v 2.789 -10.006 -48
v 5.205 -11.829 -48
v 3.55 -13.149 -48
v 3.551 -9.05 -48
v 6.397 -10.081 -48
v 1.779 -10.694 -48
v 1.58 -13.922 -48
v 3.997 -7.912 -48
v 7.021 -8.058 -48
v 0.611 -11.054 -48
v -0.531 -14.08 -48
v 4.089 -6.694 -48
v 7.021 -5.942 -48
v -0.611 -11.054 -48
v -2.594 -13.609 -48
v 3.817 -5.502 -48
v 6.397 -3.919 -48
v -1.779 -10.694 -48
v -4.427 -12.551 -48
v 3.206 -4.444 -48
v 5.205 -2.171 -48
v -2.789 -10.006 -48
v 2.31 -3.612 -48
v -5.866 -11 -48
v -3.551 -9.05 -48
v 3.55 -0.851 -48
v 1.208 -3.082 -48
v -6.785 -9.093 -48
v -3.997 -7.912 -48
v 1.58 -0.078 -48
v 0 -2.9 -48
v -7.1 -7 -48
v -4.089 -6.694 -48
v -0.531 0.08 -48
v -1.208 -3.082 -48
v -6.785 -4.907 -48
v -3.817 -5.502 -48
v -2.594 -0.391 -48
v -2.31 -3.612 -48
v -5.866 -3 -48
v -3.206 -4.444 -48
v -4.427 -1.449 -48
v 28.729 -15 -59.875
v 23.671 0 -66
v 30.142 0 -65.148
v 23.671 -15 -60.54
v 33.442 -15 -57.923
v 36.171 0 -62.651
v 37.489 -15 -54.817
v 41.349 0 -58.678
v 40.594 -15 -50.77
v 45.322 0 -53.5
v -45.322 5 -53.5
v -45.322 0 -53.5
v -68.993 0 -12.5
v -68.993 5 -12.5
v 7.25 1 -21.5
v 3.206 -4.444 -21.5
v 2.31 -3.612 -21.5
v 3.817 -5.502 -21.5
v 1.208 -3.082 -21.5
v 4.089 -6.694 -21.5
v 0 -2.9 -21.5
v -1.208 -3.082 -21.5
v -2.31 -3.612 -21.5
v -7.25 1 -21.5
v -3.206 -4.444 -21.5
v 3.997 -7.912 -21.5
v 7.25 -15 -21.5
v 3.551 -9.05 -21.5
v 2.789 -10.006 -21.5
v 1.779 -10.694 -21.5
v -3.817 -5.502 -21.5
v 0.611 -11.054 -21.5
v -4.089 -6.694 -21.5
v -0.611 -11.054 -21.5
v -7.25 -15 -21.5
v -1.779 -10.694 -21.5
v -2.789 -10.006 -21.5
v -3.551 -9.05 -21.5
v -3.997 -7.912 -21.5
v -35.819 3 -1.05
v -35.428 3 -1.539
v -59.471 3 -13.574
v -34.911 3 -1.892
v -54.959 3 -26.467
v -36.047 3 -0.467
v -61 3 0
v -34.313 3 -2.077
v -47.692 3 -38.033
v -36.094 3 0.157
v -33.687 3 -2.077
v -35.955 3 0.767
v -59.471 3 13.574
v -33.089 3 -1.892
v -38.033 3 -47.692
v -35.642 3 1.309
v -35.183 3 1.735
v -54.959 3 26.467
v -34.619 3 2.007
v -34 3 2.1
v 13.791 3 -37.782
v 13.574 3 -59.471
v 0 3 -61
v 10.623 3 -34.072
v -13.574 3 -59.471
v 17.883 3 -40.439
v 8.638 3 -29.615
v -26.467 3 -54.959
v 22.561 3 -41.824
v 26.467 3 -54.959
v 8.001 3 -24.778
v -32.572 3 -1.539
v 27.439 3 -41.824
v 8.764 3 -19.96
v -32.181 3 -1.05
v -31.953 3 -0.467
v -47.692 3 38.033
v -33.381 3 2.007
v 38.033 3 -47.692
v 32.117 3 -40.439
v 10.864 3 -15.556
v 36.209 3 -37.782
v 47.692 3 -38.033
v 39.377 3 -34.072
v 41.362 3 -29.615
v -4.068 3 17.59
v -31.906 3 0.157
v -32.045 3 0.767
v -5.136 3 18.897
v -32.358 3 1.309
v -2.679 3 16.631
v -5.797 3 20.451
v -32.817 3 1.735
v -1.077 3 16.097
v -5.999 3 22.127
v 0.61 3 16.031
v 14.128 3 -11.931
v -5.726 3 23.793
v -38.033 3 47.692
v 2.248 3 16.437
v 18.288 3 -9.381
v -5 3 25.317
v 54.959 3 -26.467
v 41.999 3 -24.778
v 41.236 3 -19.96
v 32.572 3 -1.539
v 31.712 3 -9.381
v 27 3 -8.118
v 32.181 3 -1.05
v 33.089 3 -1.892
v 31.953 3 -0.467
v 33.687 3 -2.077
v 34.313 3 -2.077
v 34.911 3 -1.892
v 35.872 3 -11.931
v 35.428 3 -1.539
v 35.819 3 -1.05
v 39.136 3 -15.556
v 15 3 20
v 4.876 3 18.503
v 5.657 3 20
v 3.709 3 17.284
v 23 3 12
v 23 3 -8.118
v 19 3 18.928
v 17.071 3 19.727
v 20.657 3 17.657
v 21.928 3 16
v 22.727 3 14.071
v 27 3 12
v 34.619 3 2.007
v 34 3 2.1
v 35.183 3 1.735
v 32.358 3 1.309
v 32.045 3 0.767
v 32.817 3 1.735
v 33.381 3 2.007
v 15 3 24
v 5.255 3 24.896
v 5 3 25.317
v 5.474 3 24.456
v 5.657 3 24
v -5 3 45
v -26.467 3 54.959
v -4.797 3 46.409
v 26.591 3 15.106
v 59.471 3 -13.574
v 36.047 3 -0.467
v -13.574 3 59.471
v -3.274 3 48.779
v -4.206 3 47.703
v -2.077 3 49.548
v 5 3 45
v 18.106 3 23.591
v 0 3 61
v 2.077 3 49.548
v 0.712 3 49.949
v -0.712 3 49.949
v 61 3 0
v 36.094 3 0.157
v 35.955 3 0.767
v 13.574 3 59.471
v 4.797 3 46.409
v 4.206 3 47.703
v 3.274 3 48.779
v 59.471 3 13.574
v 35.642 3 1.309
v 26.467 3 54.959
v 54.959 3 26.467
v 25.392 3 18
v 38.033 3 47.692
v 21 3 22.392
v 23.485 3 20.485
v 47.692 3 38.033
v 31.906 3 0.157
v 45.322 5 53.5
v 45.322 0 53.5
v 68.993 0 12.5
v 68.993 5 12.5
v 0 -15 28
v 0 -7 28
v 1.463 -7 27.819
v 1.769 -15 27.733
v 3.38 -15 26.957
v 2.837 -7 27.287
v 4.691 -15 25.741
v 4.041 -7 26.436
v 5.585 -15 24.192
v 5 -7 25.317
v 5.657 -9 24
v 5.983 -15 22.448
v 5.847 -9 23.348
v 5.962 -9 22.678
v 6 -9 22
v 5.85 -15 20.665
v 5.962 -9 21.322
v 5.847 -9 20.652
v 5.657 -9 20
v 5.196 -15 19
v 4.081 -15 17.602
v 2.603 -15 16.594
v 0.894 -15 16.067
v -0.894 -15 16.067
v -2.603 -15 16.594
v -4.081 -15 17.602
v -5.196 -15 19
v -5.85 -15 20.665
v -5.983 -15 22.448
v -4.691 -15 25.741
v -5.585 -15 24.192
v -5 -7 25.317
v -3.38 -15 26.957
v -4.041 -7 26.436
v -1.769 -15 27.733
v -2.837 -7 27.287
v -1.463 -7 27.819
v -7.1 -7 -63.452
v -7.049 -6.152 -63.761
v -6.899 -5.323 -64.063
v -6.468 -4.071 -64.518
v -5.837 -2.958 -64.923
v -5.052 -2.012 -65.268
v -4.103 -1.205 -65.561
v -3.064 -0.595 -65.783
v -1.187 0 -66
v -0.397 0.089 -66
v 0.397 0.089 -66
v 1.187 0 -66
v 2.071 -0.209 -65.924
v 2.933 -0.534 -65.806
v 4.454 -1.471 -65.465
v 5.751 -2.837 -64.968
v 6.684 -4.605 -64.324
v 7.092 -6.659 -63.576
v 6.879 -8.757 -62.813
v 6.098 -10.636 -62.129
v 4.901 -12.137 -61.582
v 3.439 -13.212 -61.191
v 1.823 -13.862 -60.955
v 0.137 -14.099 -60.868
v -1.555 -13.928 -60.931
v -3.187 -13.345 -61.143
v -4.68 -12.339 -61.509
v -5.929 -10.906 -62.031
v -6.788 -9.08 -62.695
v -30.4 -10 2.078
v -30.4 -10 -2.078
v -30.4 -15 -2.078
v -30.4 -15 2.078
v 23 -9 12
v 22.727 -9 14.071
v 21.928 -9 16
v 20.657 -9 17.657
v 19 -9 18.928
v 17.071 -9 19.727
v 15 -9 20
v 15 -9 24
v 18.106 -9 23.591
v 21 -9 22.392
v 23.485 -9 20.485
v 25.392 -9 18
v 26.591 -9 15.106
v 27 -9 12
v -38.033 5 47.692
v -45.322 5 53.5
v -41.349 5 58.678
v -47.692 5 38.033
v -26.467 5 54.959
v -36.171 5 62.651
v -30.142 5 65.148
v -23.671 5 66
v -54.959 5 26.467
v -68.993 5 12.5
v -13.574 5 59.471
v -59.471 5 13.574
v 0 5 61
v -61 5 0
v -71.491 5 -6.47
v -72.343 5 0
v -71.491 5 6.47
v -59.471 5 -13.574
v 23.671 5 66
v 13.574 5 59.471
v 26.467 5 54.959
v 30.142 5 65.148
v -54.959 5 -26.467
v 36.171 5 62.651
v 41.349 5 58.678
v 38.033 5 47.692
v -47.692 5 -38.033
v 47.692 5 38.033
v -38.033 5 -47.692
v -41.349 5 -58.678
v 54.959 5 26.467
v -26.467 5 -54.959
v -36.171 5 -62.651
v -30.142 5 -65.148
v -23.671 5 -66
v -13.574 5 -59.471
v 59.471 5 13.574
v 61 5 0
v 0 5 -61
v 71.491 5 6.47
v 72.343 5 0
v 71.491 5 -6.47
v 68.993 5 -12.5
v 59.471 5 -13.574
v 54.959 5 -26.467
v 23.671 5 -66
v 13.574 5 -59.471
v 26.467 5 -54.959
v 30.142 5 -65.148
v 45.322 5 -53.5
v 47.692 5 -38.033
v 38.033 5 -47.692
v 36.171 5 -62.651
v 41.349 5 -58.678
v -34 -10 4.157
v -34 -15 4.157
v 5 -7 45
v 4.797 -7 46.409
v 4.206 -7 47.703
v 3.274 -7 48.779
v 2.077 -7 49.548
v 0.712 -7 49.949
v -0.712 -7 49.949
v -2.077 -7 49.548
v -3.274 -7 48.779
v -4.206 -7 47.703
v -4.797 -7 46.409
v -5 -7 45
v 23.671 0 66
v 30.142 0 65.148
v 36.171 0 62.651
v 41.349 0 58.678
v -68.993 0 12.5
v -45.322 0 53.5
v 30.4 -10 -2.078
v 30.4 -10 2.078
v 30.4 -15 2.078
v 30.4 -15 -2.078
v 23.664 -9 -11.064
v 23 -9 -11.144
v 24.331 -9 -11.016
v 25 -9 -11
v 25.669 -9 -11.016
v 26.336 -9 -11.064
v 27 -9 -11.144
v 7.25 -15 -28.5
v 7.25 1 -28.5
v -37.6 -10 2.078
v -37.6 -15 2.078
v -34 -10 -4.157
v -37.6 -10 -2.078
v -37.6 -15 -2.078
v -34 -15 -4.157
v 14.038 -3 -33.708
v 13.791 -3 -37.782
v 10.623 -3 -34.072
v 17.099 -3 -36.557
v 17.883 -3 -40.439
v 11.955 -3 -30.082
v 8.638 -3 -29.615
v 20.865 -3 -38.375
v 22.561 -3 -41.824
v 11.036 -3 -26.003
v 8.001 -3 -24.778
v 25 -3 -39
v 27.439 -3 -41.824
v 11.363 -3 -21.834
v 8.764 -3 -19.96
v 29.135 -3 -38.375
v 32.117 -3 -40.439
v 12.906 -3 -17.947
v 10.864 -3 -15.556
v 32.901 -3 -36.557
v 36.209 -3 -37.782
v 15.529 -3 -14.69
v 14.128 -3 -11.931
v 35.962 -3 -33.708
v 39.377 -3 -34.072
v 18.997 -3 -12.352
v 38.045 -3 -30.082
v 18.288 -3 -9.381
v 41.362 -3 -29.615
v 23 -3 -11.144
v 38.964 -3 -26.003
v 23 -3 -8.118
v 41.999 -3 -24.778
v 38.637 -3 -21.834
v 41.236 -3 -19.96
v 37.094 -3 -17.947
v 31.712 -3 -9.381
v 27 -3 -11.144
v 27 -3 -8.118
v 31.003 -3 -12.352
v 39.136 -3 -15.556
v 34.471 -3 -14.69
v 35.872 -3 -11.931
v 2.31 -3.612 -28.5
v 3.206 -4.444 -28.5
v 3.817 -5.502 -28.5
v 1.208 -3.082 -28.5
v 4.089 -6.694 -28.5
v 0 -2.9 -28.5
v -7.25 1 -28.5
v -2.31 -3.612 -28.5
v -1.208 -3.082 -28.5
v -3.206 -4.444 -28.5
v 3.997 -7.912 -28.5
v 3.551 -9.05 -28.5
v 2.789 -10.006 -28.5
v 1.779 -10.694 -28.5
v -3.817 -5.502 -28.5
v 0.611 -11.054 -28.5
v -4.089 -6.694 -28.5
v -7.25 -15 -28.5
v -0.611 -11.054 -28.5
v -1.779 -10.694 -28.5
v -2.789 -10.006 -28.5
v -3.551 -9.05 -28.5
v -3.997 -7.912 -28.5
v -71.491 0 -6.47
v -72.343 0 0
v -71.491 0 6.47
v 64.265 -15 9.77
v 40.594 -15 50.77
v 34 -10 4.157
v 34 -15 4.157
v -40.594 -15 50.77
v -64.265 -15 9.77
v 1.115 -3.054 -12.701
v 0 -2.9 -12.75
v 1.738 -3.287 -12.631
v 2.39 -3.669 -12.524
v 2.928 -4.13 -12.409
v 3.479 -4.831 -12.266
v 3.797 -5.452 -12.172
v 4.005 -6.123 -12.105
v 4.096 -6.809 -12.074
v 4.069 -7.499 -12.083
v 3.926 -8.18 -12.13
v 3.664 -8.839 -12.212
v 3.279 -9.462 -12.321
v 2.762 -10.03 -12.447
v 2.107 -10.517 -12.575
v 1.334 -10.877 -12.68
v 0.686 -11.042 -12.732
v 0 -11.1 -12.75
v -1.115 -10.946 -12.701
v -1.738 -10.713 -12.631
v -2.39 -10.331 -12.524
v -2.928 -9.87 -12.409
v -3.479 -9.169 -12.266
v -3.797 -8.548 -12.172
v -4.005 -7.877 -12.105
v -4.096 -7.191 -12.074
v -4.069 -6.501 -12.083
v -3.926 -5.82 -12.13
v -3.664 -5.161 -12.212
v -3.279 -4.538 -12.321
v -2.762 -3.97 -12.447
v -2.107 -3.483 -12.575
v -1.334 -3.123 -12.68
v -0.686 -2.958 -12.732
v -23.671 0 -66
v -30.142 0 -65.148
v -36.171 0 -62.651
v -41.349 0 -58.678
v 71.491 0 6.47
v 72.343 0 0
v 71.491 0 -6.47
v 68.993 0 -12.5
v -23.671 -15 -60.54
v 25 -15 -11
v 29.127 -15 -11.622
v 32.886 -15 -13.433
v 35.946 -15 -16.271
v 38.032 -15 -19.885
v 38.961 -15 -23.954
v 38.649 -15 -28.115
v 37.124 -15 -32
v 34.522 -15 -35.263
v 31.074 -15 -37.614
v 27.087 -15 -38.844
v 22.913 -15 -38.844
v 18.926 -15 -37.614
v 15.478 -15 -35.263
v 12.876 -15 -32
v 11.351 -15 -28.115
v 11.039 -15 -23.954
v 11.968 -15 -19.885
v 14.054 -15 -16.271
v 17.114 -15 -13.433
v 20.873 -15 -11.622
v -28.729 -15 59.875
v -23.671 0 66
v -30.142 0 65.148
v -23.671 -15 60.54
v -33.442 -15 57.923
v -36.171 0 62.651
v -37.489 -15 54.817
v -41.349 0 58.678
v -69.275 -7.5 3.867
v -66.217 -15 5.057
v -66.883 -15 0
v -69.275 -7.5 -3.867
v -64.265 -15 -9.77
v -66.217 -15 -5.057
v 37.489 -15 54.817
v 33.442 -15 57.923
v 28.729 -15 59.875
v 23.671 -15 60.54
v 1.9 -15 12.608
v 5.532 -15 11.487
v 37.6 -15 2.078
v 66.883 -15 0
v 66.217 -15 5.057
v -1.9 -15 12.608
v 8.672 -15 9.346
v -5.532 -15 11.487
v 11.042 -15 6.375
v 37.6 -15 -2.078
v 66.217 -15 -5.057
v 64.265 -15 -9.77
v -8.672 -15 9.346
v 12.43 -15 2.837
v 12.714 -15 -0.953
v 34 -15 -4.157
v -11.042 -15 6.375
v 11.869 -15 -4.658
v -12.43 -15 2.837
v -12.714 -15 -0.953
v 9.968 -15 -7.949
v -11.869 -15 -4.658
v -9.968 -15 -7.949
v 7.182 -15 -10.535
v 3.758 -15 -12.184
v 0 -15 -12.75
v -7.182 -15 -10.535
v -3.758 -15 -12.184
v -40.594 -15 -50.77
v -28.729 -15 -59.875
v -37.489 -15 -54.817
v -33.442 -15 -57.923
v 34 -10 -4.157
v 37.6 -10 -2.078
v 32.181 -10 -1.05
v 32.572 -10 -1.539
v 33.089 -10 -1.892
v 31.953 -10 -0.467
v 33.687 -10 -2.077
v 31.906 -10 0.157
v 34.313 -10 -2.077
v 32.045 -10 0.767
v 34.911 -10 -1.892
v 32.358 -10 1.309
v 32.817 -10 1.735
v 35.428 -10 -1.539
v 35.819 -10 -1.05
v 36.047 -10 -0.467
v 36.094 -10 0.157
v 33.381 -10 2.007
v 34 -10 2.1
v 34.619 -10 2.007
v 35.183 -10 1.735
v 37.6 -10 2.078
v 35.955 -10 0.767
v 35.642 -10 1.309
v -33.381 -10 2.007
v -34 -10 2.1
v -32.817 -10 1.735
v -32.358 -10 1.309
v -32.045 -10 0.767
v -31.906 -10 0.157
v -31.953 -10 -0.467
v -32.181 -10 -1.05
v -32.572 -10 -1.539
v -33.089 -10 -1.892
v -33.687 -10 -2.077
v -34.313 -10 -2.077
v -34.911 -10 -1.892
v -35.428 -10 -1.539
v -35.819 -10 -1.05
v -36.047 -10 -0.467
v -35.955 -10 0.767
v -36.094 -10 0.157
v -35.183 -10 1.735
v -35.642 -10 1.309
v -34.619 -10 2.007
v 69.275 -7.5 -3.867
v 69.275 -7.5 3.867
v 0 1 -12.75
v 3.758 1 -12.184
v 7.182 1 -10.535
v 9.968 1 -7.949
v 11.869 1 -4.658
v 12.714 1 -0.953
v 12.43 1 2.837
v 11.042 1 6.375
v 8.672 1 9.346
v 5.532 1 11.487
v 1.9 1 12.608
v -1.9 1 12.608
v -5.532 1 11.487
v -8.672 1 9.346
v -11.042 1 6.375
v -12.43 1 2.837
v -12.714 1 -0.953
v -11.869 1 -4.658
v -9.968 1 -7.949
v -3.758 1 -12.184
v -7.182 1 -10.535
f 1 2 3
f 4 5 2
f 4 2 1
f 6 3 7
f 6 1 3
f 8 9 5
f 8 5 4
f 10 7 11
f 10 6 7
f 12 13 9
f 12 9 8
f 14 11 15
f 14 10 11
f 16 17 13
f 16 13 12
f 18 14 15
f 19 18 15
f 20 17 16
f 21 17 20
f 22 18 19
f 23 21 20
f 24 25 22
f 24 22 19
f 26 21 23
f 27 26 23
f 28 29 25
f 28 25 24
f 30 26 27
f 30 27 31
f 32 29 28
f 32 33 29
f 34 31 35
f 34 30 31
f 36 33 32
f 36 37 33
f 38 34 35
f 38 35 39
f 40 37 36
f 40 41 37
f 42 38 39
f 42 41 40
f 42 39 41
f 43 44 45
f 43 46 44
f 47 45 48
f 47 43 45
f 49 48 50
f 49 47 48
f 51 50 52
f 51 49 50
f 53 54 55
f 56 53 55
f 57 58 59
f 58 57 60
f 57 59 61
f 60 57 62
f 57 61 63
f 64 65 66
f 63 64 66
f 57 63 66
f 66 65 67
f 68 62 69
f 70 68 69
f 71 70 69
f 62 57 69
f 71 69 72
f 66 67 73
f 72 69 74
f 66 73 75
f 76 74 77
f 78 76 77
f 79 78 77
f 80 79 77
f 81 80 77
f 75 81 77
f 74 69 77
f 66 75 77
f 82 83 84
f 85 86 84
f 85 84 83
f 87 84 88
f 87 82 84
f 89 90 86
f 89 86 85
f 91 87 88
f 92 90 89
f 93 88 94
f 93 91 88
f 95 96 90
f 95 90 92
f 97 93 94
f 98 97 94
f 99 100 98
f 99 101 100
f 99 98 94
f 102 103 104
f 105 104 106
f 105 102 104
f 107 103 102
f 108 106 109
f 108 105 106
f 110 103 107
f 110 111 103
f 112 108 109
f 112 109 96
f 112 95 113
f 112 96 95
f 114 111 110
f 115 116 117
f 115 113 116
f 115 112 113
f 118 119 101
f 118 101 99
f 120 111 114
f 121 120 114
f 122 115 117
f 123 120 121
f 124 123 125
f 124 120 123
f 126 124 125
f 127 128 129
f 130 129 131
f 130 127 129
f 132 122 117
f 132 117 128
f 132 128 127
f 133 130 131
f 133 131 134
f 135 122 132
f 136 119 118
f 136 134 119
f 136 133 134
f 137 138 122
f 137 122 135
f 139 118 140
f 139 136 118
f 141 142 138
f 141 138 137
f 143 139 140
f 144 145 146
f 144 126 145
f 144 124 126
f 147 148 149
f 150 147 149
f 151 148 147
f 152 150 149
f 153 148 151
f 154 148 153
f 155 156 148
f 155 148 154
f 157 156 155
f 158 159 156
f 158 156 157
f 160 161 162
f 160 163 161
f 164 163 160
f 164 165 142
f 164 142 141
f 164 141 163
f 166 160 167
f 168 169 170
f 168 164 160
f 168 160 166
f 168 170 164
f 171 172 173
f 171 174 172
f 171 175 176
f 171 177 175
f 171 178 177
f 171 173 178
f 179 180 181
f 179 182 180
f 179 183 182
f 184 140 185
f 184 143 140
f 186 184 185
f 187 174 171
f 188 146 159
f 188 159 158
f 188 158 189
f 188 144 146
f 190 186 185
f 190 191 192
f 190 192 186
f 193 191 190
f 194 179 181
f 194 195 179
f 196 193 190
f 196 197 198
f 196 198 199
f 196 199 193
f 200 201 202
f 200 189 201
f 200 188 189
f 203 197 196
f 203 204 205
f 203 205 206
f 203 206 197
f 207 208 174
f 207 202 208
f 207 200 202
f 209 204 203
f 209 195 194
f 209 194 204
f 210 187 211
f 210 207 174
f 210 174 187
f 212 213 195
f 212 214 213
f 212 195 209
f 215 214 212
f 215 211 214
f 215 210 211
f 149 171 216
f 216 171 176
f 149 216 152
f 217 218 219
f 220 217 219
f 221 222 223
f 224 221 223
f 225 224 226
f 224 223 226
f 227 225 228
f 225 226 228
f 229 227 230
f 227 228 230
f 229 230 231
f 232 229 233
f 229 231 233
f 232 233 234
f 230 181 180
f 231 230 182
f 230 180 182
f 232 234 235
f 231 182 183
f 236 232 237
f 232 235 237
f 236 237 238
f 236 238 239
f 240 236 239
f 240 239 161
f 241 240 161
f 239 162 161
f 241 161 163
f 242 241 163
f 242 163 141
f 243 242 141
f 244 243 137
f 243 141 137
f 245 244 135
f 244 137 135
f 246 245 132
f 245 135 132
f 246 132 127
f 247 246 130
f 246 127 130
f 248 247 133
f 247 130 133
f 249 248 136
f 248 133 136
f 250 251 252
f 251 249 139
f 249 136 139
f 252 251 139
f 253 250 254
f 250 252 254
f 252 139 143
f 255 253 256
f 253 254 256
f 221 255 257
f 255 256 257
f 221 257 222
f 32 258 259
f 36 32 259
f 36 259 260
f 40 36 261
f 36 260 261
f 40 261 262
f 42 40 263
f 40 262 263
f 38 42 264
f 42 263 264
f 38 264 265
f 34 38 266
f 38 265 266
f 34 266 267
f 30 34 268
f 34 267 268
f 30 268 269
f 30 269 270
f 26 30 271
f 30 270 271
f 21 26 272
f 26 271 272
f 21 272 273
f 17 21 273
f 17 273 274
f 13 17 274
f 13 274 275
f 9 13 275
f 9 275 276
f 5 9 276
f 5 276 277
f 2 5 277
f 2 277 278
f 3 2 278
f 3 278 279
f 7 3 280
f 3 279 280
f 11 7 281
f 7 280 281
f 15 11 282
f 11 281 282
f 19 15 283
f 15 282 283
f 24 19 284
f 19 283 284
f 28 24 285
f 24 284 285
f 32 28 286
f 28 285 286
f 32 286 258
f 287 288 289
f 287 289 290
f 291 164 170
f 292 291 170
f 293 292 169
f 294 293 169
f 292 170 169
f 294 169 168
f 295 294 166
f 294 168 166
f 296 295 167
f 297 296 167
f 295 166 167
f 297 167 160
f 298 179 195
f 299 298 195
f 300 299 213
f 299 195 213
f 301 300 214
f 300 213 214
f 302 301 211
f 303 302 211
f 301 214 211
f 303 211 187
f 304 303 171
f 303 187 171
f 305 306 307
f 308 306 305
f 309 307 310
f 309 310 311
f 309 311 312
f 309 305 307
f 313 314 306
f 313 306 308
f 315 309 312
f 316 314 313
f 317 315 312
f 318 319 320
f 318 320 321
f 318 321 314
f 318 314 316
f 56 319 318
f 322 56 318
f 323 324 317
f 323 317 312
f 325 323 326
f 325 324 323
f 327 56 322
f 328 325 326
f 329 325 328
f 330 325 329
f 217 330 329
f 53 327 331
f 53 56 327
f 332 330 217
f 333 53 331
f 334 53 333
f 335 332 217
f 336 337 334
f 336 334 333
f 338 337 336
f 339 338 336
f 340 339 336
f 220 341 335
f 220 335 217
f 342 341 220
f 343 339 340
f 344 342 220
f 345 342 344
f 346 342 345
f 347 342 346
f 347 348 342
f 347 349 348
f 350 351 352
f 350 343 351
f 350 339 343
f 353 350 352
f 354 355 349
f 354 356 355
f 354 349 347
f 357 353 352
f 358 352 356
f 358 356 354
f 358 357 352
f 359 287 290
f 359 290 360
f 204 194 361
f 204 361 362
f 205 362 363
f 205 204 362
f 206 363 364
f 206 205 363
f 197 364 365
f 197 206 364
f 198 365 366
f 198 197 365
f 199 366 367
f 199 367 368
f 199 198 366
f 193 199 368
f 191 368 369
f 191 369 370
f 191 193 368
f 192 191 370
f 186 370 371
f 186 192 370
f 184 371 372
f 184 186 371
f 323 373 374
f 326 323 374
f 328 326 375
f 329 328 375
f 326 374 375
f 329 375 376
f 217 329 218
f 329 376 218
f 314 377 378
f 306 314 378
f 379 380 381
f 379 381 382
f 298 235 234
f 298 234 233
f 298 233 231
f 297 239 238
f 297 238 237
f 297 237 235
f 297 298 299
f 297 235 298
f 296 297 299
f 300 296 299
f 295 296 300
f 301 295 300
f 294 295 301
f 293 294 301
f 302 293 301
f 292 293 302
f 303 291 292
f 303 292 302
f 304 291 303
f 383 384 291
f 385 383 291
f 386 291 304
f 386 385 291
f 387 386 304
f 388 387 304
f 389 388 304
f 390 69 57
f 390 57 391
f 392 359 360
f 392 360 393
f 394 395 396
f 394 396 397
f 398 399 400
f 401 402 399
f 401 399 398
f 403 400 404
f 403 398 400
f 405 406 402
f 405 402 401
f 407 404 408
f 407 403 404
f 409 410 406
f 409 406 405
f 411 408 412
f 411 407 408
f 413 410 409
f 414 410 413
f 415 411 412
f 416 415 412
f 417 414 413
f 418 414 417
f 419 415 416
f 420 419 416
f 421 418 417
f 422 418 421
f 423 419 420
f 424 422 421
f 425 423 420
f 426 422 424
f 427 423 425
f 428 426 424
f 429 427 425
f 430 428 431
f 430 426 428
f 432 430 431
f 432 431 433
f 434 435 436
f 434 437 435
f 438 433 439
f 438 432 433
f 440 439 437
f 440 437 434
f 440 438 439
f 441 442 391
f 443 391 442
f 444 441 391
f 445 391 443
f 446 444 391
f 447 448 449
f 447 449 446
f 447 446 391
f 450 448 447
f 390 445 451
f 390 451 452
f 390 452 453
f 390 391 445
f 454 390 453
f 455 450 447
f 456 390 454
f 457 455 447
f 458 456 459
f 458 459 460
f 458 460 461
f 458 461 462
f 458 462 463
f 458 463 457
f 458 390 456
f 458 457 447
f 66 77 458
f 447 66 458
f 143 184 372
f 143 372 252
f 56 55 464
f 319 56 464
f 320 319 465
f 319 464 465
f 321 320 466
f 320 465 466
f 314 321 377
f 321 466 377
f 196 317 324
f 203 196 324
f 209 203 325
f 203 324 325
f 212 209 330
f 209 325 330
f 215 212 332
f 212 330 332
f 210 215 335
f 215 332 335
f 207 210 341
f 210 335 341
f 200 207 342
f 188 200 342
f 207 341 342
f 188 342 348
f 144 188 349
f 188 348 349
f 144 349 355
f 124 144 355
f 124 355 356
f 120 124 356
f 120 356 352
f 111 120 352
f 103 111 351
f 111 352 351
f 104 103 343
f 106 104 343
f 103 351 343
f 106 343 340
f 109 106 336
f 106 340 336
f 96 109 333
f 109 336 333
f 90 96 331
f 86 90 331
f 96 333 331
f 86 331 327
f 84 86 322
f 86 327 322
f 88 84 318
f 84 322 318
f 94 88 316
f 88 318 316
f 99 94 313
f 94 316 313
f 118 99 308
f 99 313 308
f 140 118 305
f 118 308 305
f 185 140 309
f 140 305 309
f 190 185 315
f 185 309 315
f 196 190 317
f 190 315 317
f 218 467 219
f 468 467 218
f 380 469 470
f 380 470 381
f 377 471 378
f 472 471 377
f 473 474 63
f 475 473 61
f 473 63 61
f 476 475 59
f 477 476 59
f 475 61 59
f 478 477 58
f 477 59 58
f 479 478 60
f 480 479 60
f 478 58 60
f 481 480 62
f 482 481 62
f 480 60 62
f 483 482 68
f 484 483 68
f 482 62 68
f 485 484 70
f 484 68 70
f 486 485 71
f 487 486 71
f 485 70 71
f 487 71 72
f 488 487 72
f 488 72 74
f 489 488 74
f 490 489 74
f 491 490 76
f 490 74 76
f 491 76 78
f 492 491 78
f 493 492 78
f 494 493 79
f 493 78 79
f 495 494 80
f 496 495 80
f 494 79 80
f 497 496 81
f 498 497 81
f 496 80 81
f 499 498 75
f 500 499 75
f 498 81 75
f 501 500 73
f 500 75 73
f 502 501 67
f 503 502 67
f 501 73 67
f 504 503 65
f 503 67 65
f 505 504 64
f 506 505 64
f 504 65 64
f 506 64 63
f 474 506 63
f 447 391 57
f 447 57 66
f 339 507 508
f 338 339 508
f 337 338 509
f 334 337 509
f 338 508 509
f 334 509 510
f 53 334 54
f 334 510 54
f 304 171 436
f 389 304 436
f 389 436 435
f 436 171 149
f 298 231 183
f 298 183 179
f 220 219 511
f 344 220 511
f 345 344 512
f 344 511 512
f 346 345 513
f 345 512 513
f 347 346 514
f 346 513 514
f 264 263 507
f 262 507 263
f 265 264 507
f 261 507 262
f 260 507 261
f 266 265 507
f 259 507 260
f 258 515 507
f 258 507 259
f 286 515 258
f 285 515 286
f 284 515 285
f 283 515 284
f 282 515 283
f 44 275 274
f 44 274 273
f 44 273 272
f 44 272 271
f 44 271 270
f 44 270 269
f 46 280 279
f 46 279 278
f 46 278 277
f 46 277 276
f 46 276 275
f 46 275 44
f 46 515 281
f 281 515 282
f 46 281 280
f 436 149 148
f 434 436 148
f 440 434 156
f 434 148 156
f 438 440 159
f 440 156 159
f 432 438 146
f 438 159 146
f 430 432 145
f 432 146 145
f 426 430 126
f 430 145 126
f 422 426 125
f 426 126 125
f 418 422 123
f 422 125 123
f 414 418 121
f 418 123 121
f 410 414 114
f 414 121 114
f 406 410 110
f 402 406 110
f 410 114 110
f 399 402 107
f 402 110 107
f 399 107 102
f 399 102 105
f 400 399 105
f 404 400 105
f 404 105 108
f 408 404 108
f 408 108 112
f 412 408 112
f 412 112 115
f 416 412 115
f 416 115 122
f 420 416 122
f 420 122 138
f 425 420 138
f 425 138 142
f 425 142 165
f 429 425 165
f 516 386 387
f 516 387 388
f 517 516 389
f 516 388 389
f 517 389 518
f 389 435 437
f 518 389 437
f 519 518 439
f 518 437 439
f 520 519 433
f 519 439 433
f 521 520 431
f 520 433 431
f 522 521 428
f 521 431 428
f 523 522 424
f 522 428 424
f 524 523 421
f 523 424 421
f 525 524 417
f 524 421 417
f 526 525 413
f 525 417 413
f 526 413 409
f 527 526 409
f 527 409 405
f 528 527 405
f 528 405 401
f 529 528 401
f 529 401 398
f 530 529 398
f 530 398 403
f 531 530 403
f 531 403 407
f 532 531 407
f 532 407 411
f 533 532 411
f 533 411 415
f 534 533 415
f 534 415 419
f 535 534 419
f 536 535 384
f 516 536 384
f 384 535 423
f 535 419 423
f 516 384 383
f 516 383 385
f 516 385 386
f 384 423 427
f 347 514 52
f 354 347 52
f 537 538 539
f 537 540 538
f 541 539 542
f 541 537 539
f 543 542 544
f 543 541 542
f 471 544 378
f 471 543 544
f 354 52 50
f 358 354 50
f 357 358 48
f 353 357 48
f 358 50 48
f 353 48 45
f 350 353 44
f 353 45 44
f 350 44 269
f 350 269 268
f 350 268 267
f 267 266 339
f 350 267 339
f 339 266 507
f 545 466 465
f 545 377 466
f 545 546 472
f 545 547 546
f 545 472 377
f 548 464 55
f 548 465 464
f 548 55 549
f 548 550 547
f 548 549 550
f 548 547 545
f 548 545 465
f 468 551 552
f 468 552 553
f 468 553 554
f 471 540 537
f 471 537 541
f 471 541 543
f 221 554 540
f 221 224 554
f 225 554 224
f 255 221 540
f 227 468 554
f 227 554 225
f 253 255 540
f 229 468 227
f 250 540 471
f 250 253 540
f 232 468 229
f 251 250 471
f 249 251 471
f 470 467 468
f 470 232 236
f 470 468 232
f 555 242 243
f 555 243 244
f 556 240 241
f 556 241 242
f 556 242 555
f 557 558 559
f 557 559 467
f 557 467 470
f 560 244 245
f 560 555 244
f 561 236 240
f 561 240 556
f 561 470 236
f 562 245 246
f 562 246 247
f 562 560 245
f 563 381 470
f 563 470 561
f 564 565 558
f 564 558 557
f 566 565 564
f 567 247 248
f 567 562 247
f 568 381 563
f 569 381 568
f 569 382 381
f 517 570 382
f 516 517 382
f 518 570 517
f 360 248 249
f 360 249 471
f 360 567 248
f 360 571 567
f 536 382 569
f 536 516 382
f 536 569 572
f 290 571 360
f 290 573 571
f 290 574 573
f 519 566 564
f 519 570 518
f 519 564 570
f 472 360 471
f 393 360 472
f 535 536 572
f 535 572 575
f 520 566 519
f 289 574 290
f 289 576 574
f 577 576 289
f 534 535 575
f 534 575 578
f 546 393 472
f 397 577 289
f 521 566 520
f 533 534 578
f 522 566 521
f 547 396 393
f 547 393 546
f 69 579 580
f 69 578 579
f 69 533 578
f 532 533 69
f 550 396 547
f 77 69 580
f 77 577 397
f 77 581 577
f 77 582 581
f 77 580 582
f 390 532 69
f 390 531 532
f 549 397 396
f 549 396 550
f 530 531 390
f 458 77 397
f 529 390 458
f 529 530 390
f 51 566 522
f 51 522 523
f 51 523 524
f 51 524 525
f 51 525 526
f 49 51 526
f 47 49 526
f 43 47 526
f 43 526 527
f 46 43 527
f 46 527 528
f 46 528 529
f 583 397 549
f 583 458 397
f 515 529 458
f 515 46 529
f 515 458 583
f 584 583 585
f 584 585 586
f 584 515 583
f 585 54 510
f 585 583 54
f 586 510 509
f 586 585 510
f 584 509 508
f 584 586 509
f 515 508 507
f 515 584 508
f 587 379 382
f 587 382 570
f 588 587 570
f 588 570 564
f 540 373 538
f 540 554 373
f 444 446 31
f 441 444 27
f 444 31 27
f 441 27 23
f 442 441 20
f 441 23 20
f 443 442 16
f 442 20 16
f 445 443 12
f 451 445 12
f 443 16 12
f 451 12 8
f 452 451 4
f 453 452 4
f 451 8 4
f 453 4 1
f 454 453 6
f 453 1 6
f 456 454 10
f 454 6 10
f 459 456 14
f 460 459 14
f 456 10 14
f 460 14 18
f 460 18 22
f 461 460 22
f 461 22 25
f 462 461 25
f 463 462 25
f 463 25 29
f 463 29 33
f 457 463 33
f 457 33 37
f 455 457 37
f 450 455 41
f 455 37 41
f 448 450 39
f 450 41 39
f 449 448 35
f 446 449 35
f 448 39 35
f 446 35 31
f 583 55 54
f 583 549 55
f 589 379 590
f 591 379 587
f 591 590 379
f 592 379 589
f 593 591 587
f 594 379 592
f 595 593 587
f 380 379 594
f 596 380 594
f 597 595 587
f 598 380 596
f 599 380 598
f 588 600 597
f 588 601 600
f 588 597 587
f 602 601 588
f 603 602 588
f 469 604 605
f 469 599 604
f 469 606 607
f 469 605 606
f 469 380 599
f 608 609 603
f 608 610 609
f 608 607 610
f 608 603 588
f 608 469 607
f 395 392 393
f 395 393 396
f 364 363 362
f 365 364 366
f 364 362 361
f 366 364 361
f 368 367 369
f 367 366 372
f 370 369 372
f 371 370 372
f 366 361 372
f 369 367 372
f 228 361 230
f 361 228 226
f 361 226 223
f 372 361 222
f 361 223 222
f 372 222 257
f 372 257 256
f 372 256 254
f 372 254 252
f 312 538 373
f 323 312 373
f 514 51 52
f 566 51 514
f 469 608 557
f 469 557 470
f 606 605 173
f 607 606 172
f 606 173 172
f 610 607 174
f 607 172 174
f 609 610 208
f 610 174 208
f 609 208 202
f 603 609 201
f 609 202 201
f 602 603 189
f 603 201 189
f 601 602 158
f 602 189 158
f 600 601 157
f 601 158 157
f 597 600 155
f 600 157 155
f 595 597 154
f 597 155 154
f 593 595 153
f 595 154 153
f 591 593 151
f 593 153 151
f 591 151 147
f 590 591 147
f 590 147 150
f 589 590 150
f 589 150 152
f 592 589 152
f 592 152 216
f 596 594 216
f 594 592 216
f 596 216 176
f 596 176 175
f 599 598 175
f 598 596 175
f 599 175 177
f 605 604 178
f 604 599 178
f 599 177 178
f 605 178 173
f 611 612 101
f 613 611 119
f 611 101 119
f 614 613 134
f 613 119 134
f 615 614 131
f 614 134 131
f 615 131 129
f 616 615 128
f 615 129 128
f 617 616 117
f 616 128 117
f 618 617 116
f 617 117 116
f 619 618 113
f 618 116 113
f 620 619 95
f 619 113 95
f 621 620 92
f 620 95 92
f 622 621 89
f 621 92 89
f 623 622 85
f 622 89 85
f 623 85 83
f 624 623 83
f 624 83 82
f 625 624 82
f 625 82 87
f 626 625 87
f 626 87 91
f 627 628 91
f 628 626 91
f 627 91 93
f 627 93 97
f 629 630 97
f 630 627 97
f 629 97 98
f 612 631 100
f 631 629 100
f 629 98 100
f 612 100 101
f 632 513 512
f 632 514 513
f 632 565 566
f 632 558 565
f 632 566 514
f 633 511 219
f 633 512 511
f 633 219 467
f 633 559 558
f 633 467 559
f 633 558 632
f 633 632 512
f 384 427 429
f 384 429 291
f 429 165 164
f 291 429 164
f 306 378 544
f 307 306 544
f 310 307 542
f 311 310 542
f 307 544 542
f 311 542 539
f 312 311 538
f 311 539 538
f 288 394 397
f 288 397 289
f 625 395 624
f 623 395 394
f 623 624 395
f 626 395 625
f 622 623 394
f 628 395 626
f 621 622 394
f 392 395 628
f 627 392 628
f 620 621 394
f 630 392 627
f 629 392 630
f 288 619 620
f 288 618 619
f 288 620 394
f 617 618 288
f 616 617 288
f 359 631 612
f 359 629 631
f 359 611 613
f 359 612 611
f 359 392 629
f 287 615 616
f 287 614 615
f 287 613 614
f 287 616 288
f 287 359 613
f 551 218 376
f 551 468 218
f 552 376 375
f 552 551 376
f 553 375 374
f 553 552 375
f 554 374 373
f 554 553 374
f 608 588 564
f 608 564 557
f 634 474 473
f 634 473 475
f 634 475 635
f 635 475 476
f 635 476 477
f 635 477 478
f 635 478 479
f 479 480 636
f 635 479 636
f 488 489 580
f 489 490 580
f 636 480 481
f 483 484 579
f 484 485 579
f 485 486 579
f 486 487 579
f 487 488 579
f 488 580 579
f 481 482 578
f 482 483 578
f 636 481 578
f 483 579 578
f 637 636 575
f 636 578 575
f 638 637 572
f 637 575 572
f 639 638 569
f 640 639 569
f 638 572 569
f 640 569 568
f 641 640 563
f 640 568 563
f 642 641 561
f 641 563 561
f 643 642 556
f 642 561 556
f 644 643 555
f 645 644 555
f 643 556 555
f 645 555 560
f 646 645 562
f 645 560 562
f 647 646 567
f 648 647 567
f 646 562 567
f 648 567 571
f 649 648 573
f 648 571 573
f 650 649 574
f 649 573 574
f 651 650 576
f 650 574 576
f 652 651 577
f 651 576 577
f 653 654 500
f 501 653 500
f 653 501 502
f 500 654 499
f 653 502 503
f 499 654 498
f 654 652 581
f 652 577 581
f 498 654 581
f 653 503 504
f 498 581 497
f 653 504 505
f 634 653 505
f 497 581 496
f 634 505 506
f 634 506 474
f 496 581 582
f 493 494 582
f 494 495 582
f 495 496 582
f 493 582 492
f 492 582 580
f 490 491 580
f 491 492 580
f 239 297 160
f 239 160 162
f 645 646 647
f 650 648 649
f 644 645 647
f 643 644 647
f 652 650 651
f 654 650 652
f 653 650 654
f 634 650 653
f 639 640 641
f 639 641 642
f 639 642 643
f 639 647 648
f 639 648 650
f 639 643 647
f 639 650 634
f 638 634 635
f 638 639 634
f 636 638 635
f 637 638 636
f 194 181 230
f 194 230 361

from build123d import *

# Parameters (mm, degrees)
BOSS_EXTRUDE1_DEPTH = 5
BOSS_EXTRUDE2_DEPTH = 15
BOSS_EXTRUDE2_TAPER = 20
SKETCH3_R           = 61
CUT_EXTRUDE1_DEPTH  = 2
SKETCH4_R           = 17
CUT_EXTRUDE2_DEPTH  = 6
CUT_EXTRUDE3_REACH  = 100.658
SKETCH7_R           = 14
SKETCH8_R           = 12.75
CUT_EXTRUDE4_DEPTH  = 16
SKETCH9_R           = 2.1
CUT_EXTRUDE5_DEPTH  = 20
SKETCH12_R          = 4.1
CUT_EXTRUDE7_DEPTH  = 60
SKETCH13_R          = 7.1
CUT_EXTRUDE8_DEPTH  = 18
SKETCH14_W          = 14.5
SKETCH14_H          = 7
CUT_EXTRUDE9_DEPTH  = 16
CUT_EXTRUDE10_START = -5
SKETCH15_R          = 2.1
CUT_EXTRUDE10_DEPTH = 5
CUT_EXTRUDE11_REACH = 101.566
SKETCH16_R          = 6
CUT_EXTRUDE12_DEPTH = 12
CUT_EXTRUDE13_DEPTH = 10


with BuildPart() as part:
    # Sketch1 → Boss-Extrude1 (new body)
    with BuildSketch(Plane(origin=(0, 0, 0), x_dir=(1, 0, 0), z_dir=(0, 1, 0))):
        with BuildLine():
            Line((68.993357168, 12.5), (45.321996131, 53.5))
            ThreePointArc((45.321996131, 53.5), (36.171361037, 62.650635095), (23.671361037, 66))
            Line((23.671361037, 66), (-23.671361037, 66))
            ThreePointArc((-23.671361037, 66), (-36.171361037, 62.650635095), (-45.321996131, 53.5))
            Line((-45.321996131, 53.5), (-68.993357168, 12.5))
            ThreePointArc((-68.993357168, 12.5), (-72.342722074, 0), (-68.993357168, -12.5))
            Line((-68.993357168, -12.5), (-45.321996131, -53.5))
            ThreePointArc((-45.321996131, -53.5), (-36.171361037, -62.650635095), (-23.671361037, -66))
            Line((-23.671361037, -66), (23.671361037, -66))
            ThreePointArc((23.671361037, -66), (36.171361037, -62.650635095), (45.321996131, -53.5))
            Line((45.321996131, -53.5), (68.993357168, -12.5))
            ThreePointArc((68.993357168, -12.5), (72.342722074, 0), (68.993357168, 12.5))
        make_face()
    extrude(amount=BOSS_EXTRUDE1_DEPTH)

    # Sketch2 → Boss-Extrude2 (add)
    with BuildSketch(Plane.XZ):
        with BuildLine():
            Line((-68.993357168, -12.5), (-45.321996131, -53.5))
            ThreePointArc((-45.321996131, -53.5), (-36.171361037, -62.650635095), (-23.671361037, -66))
            Line((-23.671361037, -66), (23.671361037, -66))
            ThreePointArc((23.671361037, -66), (36.171361037, -62.650635095), (45.321996131, -53.5))
            Line((45.321996131, -53.5), (68.993357168, -12.5))
            ThreePointArc((68.993357168, -12.5), (72.342722074, 0), (68.993357168, 12.5))
            Line((68.993357168, 12.5), (45.321996131, 53.5))
            ThreePointArc((45.321996131, 53.5), (36.171361037, 62.650635095), (23.671361037, 66))
            Line((23.671361037, 66), (-23.671361037, 66))
            ThreePointArc((-23.671361037, 66), (-36.171361037, 62.650635095), (-45.321996131, 53.5))
            Line((-45.321996131, 53.5), (-68.993357168, 12.5))
            ThreePointArc((-68.993357168, 12.5), (-72.342722074, 0), (-68.993357168, -12.5))
        make_face()
    extrude(amount=BOSS_EXTRUDE2_DEPTH, taper=BOSS_EXTRUDE2_TAPER)

    # Sketch3 → Cut-Extrude1 (cut)
    with BuildSketch(Plane(origin=(0, 5, 0), x_dir=(1, 0, 0), z_dir=(0, 1, 0))):
        with Locations(Location((0, 0, 0), (0, 0, 270))):
            Circle(SKETCH3_R)
    extrude(amount=-CUT_EXTRUDE1_DEPTH, mode=Mode.SUBTRACT)

    # Sketch4 → Cut-Extrude2 (cut)
    with BuildSketch(Plane(origin=(0, 3, 0), x_dir=(1, 0, 0), z_dir=(0, 1, 0))):
        with Locations(Location((25, 25, 0), (0, 0, 270))):
            Circle(SKETCH4_R)
    extrude(amount=-CUT_EXTRUDE2_DEPTH, mode=Mode.SUBTRACT)

    # Sketch7 → Cut-Extrude3 (cut, up to next)
    with BuildSketch(Plane(origin=(0, -3, 0), x_dir=(1, 0, 0), z_dir=(0, 1, 0)), mode=Mode.PRIVATE) as cut_extrude3_sk1:
        with Locations(Location((25, 25, 0), (0, 0, 270))):
            Circle(SKETCH7_R)
    cut_extrude3_tool1 = extrude(cut_extrude3_sk1.sketch, amount=-CUT_EXTRUDE3_REACH, mode=Mode.PRIVATE) & part.part
    add(cut_extrude3_tool1.solids().sort_by_distance((25, -3, -25))[0], mode=Mode.SUBTRACT)

    # Sketch8 → Cut-Extrude4 (cut)
    with BuildSketch(Plane(origin=(0, -15, 0), x_dir=(-1, 0, 0), z_dir=(0, -1, 0))):
        with Locations(Location((0, 0, 0), (0, 0, 90))):
            Circle(SKETCH8_R)
    extrude(amount=-CUT_EXTRUDE4_DEPTH, mode=Mode.SUBTRACT)

    # Sketch9 → Cut-Extrude5 (cut)
    with BuildSketch(Plane(origin=(0, 3, 0), x_dir=(1, 0, 0), z_dir=(0, 1, 0))):
        with Locations(Location((34, 0, 0), (0, 0, 270))):
            Circle(SKETCH9_R)
        with Locations(Location((-34, 0, 0), (0, 0, 270))):
            Circle(SKETCH9_R)
    extrude(amount=-CUT_EXTRUDE5_DEPTH, mode=Mode.SUBTRACT)

    # Sketch12 → Cut-Extrude7 (cut)
    with BuildSketch(Plane(origin=(0, 0, -66), x_dir=(-1, 0, 0), z_dir=(0, 0, -1))):
        with Locations(Location((0, -7, 0), (0, 0, 90))):
            Circle(SKETCH12_R)
    extrude(amount=-CUT_EXTRUDE7_DEPTH, mode=Mode.SUBTRACT)

    # Sketch13 → Cut-Extrude8 (cut)
    with BuildSketch(Plane(origin=(0, 0, -66), x_dir=(-1, 0, 0), z_dir=(0, 0, -1))):
        with Locations((0, -7)):
            Circle(SKETCH13_R)
    extrude(amount=-CUT_EXTRUDE8_DEPTH, mode=Mode.SUBTRACT)

    # Sketch14 → Cut-Extrude9 (cut)
    with BuildSketch(Plane(origin=(0, -15, 0), x_dir=(-1, 0, 0), z_dir=(0, -1, 0))):
        with Locations((0, 25)):
            Rectangle(SKETCH14_W, SKETCH14_H)
    extrude(amount=-CUT_EXTRUDE9_DEPTH, mode=Mode.SUBTRACT)

    # Sketch15 → Cut-Extrude10 (cut)
    # profile 1 of 2: a face of its own
    with BuildSketch(Plane.XZ.offset(15).offset(CUT_EXTRUDE10_START)):
        Polygon((-34, 4.156921938), (-37.6, 2.078460969), (-37.6, -2.078460969), (-34, -4.156921938), (-30.4, -2.078460969), (-30.4, 2.078460969), align=None)
        with Locations(Location((-34, 0, 0), (0, 0, 90))):
            Circle(SKETCH15_R, mode=Mode.SUBTRACT)
    # profile 2 of 2: a face of its own
    with BuildSketch(Plane.XZ.offset(15).offset(CUT_EXTRUDE10_START)):
        Polygon((34, 4.156921938), (30.4, 2.078460969), (30.4, -2.078460969), (34, -4.156921938), (37.6, -2.078460969), (37.6, 2.078460969), align=None)
        with Locations(Location((34, 0, 0), (0, 0, 90))):
            Circle(SKETCH15_R, mode=Mode.SUBTRACT)
    extrude(amount=CUT_EXTRUDE10_DEPTH, mode=Mode.SUBTRACT)

    # Sketch16 → Cut-Extrude11 (cut, up to next)
    with BuildSketch(Plane(origin=(0, 3, 0), x_dir=(1, 0, 0), z_dir=(0, 1, 0)), mode=Mode.PRIVATE) as cut_extrude11_sk1:
        with Locations(Location((0, -22, 0), (0, 0, 270))):
            Circle(SKETCH16_R)
    cut_extrude11_tool1 = extrude(cut_extrude11_sk1.sketch, amount=-CUT_EXTRUDE11_REACH, mode=Mode.PRIVATE) & part.part
    add(cut_extrude11_tool1.solids().sort_by_distance((0, 3, 22))[0], mode=Mode.SUBTRACT)

    # Sketch17 → Cut-Extrude12 (cut)
    with BuildSketch(Plane(origin=(0, 3, 0), x_dir=(1, 0, 0), z_dir=(0, 1, 0))):
        with BuildLine():
            Line((25, -12), (25, 8))
            ThreePointArc((25, 8), (23.998259334, 8.029539911), (23, 8.118056984))
            Line((23, 8.118056984), (23, -12))
            ThreePointArc((23, -12), (20.656854249, -17.656854249), (15, -20))
            Line((15, -20), (5.656854249, -20))
            ThreePointArc((5.656854249, -20), (5.913591358, -20.985388128), (6, -22))
            Line((6, -22), (15, -22))
            ThreePointArc((15, -22), (22.071067812, -19.071067812), (25, -12))
        make_face()
        with BuildLine():
            ThreePointArc((27, 8.118056984), (26.001740666, 8.029539911), (25, 8))
            Line((25, 8), (25, -12))
            ThreePointArc((25, -12), (22.071067812, -19.071067812), (15, -22))
            Line((15, -22), (6, -22))
            ThreePointArc((6, -22), (5.913591358, -23.014611872), (5.656854249, -24))
            Line((5.656854249, -24), (15, -24))
            ThreePointArc((15, -24), (23.485281374, -20.485281374), (27, -12))
            Line((27, -12), (27, 8.118056984))
        make_face()
        with BuildLine():
            Line((25, 8), (25, 25))
            Line((25, 25), (23, 25))
            Line((23, 25), (23, 8.118056984))
            ThreePointArc((23, 8.118056984), (23.998259334, 8.029539911), (25, 8))
        make_face()
        with BuildLine():
            Line((27, 25), (25, 25))
            Line((25, 25), (25, 8))
            ThreePointArc((25, 8), (26.001740666, 8.029539911), (27, 8.118056984))
            Line((27, 8.118056984), (27, 25))
        make_face()
    extrude(amount=-CUT_EXTRUDE12_DEPTH, mode=Mode.SUBTRACT)

    # Sketch18 → Cut-Extrude13 (cut)
    with BuildSketch(Plane(origin=(0, 3, 0), x_dir=(1, 0, 0), z_dir=(0, 1, 0))):
        with BuildLine():
            Line((5, -25), (5, -45))
            ThreePointArc((5, -45), (0, -50), (-5, -45))
            Line((-5, -45), (-5, -25))
            ThreePointArc((-5, -25), (0, -20), (5, -25))
        make_face()
    extrude(amount=-CUT_EXTRUDE13_DEPTH, mode=Mode.SUBTRACT)


solid = part.part
